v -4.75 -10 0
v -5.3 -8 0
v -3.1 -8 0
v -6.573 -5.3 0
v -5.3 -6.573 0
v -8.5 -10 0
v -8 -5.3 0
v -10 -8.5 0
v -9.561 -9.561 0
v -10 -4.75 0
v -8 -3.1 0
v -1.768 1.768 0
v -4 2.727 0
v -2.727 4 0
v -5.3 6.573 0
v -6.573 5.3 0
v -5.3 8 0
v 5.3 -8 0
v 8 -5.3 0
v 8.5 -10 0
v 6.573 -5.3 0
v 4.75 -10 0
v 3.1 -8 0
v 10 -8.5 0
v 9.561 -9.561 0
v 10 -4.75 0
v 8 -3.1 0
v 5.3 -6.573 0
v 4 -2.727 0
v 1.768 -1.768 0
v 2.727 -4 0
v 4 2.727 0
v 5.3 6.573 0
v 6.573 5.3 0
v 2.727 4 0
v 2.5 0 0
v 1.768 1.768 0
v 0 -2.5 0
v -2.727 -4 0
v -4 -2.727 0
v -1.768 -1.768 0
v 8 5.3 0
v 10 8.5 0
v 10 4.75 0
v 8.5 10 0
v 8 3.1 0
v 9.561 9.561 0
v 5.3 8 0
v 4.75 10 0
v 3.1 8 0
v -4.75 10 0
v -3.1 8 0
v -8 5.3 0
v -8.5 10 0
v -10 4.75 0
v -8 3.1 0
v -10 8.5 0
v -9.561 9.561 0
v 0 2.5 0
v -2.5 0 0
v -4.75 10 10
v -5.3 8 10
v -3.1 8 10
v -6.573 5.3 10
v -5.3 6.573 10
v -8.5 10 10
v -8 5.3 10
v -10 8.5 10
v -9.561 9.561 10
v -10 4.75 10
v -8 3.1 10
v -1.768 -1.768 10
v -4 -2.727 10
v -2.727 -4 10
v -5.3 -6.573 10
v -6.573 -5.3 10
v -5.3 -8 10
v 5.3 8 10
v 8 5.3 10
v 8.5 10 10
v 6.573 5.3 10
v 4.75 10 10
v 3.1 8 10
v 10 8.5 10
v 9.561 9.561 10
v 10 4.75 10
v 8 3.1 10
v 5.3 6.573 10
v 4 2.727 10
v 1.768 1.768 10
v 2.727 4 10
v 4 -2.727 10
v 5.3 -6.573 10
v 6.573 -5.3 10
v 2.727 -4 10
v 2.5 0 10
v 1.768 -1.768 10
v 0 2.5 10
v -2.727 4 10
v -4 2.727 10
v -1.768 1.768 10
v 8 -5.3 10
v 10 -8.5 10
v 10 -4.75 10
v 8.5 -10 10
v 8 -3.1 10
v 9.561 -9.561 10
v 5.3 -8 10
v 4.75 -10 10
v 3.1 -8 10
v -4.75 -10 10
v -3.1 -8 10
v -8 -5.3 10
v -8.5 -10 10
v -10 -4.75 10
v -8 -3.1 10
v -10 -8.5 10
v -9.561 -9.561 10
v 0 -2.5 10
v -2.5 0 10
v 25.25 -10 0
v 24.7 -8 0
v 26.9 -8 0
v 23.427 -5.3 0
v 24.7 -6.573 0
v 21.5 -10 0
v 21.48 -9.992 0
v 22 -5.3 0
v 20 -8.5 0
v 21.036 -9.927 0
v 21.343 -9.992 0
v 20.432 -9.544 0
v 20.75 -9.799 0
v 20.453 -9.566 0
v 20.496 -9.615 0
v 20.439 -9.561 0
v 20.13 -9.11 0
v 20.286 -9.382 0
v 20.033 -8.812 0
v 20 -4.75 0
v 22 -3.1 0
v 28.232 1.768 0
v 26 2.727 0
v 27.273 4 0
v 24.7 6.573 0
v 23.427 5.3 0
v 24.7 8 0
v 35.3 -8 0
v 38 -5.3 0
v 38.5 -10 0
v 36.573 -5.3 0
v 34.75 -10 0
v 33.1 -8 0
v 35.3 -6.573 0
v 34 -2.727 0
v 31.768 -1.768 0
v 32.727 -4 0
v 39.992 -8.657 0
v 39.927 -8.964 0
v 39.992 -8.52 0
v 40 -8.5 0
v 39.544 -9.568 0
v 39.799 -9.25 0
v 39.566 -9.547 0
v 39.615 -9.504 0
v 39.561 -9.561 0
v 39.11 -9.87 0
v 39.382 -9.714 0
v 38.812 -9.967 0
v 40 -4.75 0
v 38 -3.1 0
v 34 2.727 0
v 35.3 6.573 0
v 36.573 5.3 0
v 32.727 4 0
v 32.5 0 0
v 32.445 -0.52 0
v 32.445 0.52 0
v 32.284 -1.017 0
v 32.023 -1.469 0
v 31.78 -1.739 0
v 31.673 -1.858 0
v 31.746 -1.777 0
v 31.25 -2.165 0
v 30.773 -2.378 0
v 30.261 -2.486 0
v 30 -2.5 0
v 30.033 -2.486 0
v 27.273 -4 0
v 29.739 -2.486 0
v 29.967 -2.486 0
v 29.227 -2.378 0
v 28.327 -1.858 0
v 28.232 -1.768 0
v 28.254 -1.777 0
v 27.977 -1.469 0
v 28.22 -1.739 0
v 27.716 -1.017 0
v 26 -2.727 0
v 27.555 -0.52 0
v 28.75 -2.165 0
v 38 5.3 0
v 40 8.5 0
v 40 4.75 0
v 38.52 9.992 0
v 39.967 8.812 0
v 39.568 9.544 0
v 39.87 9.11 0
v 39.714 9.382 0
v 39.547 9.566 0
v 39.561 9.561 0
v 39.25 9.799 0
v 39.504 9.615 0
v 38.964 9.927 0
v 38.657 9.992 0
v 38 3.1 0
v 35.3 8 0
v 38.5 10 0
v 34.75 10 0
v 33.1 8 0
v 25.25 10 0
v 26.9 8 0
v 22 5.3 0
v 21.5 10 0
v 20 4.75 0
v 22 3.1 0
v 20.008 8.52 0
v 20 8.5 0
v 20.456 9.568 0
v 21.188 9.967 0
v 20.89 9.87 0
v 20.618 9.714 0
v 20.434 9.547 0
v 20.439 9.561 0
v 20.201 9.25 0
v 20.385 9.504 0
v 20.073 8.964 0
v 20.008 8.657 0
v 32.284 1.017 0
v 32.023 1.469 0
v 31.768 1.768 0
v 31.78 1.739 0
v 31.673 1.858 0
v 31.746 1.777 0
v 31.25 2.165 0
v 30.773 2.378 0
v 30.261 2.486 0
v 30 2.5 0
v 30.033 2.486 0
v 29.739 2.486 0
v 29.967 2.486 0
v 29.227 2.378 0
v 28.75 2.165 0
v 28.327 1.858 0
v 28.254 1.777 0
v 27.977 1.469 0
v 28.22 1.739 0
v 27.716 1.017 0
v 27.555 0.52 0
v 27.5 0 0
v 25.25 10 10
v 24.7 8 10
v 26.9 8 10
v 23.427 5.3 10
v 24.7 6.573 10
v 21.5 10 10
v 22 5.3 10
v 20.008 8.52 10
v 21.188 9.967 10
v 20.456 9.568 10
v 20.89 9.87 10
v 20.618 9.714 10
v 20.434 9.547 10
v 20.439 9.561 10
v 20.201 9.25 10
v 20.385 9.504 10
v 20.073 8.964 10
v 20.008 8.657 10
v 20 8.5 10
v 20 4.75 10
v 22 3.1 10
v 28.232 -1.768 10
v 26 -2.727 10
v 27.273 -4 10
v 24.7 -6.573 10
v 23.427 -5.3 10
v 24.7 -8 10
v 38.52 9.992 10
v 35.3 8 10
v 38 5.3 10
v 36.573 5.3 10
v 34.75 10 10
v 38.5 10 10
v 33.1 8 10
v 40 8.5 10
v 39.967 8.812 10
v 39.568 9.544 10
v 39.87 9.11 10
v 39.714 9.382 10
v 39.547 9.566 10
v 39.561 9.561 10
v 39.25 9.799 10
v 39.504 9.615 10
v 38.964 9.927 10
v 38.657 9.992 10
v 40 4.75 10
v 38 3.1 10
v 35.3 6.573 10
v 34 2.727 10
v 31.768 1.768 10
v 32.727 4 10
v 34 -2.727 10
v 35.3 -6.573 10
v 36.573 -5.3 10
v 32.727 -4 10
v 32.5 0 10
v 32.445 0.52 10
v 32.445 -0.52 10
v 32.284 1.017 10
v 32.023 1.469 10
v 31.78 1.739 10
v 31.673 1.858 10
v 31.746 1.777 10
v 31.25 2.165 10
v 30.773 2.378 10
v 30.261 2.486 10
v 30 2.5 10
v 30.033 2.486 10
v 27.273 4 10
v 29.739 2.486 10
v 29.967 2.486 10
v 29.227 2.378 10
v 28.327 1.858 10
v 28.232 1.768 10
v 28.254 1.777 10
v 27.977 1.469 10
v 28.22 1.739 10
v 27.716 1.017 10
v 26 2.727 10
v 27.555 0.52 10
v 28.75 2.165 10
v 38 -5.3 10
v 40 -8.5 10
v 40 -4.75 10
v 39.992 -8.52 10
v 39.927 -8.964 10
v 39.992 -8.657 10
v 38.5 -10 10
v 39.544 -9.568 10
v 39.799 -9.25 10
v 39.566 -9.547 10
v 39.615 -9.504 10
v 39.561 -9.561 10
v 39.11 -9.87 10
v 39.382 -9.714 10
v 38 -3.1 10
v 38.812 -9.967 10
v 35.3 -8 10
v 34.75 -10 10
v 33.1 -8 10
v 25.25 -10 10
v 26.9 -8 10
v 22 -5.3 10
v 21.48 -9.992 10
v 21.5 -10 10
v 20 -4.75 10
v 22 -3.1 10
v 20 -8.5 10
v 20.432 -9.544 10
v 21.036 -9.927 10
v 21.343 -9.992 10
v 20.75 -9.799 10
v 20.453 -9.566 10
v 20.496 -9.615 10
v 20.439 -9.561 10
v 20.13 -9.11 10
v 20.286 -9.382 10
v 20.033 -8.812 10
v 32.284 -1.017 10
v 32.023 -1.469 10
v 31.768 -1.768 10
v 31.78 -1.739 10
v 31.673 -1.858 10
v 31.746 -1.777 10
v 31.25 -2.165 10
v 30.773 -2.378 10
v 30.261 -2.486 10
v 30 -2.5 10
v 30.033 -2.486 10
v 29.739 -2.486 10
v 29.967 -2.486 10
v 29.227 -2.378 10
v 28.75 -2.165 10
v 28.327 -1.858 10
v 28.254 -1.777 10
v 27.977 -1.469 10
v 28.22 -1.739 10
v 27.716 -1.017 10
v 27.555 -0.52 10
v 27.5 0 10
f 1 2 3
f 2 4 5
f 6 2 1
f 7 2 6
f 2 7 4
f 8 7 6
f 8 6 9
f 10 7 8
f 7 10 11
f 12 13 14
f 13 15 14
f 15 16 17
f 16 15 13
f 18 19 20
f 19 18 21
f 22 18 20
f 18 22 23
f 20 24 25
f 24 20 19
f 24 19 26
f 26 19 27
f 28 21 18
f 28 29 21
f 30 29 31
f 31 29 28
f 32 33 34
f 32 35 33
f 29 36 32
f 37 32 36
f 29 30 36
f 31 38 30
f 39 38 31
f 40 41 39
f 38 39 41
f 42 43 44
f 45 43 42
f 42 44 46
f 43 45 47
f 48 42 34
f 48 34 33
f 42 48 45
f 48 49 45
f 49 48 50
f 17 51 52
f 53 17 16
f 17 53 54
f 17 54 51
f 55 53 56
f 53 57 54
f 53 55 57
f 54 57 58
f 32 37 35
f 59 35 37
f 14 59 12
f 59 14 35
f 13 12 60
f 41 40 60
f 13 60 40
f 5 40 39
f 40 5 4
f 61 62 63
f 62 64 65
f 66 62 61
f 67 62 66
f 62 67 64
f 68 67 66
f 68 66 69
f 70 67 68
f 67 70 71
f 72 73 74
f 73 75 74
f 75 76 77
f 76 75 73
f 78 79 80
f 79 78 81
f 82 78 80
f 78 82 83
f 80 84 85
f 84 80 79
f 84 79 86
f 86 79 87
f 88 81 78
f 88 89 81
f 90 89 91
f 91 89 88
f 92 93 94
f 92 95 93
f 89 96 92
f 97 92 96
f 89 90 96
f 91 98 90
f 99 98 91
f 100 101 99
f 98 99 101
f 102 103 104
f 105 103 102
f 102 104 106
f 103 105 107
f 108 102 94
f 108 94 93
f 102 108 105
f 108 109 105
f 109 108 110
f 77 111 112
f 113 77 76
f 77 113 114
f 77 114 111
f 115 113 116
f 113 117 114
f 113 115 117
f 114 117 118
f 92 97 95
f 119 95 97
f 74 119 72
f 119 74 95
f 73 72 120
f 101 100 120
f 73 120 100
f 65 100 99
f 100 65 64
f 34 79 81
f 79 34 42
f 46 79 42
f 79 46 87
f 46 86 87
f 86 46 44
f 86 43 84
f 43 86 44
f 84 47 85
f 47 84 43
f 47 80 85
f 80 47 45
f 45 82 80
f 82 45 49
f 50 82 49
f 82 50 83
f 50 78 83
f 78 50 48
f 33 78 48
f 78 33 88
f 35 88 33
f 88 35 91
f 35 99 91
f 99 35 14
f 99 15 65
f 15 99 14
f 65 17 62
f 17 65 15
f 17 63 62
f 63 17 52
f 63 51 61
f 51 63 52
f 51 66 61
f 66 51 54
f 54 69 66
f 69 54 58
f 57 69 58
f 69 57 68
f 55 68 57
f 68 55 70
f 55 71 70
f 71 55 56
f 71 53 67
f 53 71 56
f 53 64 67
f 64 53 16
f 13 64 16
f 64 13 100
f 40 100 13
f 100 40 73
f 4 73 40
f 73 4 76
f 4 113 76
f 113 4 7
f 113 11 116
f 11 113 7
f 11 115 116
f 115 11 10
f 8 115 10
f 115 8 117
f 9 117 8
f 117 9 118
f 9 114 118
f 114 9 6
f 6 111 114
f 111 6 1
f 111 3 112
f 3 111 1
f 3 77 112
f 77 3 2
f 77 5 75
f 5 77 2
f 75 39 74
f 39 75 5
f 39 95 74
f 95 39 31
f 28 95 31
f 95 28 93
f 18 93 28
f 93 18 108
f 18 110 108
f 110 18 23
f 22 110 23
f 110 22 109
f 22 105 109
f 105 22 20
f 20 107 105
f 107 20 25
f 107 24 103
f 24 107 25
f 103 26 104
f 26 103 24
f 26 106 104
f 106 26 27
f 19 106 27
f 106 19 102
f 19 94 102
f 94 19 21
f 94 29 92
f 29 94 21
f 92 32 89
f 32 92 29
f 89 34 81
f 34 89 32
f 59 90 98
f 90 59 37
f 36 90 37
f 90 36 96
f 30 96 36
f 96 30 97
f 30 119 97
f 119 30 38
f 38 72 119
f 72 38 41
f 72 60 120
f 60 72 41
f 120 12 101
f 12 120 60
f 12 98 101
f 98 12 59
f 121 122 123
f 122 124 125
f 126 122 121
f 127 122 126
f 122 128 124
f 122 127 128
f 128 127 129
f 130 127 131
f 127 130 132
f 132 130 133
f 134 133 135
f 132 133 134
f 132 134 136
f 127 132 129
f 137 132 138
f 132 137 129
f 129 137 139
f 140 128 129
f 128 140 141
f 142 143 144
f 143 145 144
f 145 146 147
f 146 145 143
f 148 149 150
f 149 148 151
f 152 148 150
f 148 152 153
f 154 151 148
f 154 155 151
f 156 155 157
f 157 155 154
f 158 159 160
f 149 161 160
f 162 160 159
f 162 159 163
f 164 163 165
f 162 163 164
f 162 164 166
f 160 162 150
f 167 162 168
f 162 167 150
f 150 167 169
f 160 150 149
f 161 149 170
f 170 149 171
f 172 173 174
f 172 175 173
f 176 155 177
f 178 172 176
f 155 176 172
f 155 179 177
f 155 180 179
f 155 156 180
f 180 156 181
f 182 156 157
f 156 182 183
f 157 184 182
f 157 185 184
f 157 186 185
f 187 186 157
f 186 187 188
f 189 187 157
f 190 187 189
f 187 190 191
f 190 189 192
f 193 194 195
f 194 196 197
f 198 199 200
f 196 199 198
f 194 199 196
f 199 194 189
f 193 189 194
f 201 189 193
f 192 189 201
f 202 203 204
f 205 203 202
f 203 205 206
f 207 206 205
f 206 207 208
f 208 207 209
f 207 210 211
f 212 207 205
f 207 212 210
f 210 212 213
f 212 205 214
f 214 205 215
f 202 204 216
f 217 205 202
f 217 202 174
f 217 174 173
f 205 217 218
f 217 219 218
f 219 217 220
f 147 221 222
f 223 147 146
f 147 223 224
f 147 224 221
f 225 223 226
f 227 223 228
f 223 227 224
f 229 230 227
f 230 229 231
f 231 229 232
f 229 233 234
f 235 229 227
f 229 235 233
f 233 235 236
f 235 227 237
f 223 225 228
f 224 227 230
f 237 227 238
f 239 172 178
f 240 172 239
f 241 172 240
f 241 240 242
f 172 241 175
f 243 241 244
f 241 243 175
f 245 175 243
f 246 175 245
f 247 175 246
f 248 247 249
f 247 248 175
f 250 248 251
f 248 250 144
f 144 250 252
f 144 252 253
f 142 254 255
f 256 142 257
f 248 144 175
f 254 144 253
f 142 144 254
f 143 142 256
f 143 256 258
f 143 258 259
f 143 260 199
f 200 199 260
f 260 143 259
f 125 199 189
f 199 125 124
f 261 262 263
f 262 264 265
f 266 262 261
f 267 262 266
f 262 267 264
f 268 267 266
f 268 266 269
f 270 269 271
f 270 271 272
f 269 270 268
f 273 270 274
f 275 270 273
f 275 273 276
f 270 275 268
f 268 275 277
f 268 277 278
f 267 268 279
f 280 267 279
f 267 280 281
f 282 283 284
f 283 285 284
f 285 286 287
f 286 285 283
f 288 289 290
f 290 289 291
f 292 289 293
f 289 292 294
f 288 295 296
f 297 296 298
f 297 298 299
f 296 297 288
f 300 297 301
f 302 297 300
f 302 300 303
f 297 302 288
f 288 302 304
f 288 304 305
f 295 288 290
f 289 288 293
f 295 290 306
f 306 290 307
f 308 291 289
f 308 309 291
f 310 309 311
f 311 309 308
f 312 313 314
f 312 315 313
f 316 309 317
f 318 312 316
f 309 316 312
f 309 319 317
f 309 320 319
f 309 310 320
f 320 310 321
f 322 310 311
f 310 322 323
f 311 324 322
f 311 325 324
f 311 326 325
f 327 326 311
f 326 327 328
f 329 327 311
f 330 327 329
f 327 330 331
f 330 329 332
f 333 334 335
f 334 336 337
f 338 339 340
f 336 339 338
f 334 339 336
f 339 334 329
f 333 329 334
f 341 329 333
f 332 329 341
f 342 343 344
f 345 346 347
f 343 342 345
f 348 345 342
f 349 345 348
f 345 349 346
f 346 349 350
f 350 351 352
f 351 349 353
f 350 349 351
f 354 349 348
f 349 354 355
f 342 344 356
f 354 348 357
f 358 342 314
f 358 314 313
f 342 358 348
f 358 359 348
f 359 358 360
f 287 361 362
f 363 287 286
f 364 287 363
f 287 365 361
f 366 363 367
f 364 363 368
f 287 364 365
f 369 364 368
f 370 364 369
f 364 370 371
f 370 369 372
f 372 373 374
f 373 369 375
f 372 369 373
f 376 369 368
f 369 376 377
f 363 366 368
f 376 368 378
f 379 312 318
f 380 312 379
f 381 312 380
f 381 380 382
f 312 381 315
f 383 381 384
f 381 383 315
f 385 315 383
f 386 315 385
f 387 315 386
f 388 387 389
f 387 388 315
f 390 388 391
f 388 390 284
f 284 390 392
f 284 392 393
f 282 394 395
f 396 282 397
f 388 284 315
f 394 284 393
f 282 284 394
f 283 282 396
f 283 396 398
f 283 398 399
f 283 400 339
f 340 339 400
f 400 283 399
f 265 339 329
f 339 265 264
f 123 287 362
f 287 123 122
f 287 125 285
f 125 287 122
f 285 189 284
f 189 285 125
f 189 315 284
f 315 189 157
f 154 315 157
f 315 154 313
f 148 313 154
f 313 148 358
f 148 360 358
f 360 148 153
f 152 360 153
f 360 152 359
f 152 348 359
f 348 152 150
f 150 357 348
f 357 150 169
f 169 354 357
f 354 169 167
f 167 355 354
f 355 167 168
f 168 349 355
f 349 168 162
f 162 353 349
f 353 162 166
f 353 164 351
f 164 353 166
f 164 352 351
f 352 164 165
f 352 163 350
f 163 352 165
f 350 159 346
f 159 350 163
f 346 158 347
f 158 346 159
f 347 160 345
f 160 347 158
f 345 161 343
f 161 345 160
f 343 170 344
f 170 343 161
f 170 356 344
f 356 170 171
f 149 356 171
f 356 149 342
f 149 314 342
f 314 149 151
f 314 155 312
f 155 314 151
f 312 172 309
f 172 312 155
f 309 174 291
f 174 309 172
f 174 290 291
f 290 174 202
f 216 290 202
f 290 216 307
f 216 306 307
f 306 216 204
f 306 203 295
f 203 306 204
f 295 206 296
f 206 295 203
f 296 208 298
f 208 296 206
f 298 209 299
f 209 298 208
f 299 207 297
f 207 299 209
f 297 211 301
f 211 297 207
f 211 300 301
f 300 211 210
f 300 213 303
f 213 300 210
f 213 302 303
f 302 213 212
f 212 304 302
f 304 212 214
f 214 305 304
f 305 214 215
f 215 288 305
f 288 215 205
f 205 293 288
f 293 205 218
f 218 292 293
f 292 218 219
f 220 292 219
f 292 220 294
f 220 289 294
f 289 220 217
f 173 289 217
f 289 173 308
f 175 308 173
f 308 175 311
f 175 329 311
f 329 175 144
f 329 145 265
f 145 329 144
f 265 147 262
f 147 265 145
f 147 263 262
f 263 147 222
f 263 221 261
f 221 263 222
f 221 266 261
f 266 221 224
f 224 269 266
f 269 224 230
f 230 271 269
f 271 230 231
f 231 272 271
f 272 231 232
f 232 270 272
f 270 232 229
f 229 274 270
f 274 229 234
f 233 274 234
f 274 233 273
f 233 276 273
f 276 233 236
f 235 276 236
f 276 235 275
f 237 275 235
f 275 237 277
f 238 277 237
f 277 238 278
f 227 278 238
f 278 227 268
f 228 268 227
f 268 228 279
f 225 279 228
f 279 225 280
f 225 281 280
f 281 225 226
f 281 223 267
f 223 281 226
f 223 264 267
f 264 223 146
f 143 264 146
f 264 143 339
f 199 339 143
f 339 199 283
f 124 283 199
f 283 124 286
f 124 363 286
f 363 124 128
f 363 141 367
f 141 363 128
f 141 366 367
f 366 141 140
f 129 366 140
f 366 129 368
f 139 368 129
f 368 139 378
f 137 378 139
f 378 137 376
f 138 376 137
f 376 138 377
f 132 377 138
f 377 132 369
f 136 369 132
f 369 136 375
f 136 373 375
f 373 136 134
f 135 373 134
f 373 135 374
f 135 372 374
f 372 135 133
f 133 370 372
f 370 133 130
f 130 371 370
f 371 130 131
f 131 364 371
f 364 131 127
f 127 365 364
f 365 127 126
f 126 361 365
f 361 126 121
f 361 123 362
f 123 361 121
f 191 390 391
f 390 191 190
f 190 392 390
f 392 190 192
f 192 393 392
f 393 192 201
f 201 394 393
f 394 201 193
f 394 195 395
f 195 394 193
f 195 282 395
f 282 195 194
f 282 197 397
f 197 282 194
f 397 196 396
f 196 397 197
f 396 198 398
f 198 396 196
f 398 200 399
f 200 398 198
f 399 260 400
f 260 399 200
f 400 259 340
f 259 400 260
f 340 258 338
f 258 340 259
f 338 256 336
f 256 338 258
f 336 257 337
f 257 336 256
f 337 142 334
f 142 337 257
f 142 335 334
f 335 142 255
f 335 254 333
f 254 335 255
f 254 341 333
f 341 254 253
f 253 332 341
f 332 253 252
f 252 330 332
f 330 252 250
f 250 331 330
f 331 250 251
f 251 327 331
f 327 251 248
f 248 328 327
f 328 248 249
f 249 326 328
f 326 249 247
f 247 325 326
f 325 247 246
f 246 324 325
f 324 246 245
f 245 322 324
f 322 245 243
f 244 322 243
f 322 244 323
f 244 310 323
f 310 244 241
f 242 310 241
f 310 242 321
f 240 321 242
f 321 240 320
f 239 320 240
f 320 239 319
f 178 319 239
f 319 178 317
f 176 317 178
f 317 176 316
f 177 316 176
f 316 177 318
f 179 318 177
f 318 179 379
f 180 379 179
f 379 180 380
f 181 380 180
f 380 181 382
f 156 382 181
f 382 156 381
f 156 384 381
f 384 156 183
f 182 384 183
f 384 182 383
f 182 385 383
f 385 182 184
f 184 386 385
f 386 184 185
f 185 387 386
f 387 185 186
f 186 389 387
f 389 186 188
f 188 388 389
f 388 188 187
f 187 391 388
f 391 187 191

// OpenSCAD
// Aleksandr Saechnikov 17 june 2015

extrusion_profile_20x20_v_slot(size=20, height=10);
translate([30,0,0]) extrusion_profile_20x20_v_slot_smooth(size=20, height=10);

$fn = 30;

module v_slot(height=10, smooth=true){
    if (smooth){
        color("Gainsboro")
        extrusion_profile_20x20_v_slot_smooth(height=height);
    }
    else {
        color("Gainsboro")
        extrusion_profile_20x20_v_slot(height=height);
    }
}

module extrusion_profile_20x20_v_slot(size=20, height=10) {
	linear_extrude(height=height) {
		union() {
			extrusion_profile_20x20_v_slot_part(size);
			rotate([0,0,90])  extrusion_profile_20x20_v_slot_part(size);
			rotate([0,0,180]) extrusion_profile_20x20_v_slot_part(size);
			rotate([0,0,270]) extrusion_profile_20x20_v_slot_part(size);
		}
	}
}

module extrusion_profile_20x20_v_slot_part(size=20) {
	d = 5;
	r = 1.5;
	s1 = 1.8;
	s2 = 2;
	s3 = 6;
	s4 = 6.2;
	s5 = 9.5;
	s6 = 10.6;
	s7 = 20;

	reSize = size/20; // Scalling

	k0 = 0;
	k1 = d*0.5*cos(45)*reSize;
	k2 = d*0.5*reSize;
	k3 = ( (s7*0.5-s3)-s1*0.5*sqrt(2) )*reSize;
	k4 = s4*0.5*reSize;
	k5 = ( s7*0.5-s3 )*reSize;
	k6 = s6*0.5*reSize;
	k7 = ( s6*0.5+s1*0.5*sqrt(2) )*reSize;
	k8 = ( s7*0.5-s2 )*reSize;
	k9 = s5*0.5*reSize;
	k10 = s7*0.5*reSize;
	k10_1 = k10-r*(1-cos(45))*reSize;
	k10_2 = k10-r*reSize;

	polygon(points=[
		[k1,k1],[k0,k2],[k0,k5],[k3,k5],
		[k6,k7],[k6,k8],[k4,k8],[k9,k10],
		[k10_2,k10],[k10_1,k10_1],
		[k10,k10_2],
		[k10,k9],[k8,k4],[k8,k6],[k7,k6],
		[k5,k3],[k5,k0],[k2,k0]
	]);
}

module extrusion_profile_20x20_v_slot_smooth(size=20, height=10) {
	linear_extrude(height=height) {
		difference() {	
			union() {
				extrusion_profile_20x20_v_slot_part_smooth(size);
				rotate([0,0,90])  extrusion_profile_20x20_v_slot_part_smooth(size);
				rotate([0,0,180]) extrusion_profile_20x20_v_slot_part_smooth(size);
				rotate([0,0,270]) extrusion_profile_20x20_v_slot_part_smooth(size);
			}
			circle([0,0],r=size/20.*2.5);
		}
	}
}

module extrusion_profile_20x20_v_slot_part_smooth(size=20) {
	r_center = 0.5*size-1.5*size/20;
	union() {
		translate ([r_center,r_center]) circle(r=1.5*size/20);
		extrusion_profile_20x20_v_slot_part(size);
	}
}
